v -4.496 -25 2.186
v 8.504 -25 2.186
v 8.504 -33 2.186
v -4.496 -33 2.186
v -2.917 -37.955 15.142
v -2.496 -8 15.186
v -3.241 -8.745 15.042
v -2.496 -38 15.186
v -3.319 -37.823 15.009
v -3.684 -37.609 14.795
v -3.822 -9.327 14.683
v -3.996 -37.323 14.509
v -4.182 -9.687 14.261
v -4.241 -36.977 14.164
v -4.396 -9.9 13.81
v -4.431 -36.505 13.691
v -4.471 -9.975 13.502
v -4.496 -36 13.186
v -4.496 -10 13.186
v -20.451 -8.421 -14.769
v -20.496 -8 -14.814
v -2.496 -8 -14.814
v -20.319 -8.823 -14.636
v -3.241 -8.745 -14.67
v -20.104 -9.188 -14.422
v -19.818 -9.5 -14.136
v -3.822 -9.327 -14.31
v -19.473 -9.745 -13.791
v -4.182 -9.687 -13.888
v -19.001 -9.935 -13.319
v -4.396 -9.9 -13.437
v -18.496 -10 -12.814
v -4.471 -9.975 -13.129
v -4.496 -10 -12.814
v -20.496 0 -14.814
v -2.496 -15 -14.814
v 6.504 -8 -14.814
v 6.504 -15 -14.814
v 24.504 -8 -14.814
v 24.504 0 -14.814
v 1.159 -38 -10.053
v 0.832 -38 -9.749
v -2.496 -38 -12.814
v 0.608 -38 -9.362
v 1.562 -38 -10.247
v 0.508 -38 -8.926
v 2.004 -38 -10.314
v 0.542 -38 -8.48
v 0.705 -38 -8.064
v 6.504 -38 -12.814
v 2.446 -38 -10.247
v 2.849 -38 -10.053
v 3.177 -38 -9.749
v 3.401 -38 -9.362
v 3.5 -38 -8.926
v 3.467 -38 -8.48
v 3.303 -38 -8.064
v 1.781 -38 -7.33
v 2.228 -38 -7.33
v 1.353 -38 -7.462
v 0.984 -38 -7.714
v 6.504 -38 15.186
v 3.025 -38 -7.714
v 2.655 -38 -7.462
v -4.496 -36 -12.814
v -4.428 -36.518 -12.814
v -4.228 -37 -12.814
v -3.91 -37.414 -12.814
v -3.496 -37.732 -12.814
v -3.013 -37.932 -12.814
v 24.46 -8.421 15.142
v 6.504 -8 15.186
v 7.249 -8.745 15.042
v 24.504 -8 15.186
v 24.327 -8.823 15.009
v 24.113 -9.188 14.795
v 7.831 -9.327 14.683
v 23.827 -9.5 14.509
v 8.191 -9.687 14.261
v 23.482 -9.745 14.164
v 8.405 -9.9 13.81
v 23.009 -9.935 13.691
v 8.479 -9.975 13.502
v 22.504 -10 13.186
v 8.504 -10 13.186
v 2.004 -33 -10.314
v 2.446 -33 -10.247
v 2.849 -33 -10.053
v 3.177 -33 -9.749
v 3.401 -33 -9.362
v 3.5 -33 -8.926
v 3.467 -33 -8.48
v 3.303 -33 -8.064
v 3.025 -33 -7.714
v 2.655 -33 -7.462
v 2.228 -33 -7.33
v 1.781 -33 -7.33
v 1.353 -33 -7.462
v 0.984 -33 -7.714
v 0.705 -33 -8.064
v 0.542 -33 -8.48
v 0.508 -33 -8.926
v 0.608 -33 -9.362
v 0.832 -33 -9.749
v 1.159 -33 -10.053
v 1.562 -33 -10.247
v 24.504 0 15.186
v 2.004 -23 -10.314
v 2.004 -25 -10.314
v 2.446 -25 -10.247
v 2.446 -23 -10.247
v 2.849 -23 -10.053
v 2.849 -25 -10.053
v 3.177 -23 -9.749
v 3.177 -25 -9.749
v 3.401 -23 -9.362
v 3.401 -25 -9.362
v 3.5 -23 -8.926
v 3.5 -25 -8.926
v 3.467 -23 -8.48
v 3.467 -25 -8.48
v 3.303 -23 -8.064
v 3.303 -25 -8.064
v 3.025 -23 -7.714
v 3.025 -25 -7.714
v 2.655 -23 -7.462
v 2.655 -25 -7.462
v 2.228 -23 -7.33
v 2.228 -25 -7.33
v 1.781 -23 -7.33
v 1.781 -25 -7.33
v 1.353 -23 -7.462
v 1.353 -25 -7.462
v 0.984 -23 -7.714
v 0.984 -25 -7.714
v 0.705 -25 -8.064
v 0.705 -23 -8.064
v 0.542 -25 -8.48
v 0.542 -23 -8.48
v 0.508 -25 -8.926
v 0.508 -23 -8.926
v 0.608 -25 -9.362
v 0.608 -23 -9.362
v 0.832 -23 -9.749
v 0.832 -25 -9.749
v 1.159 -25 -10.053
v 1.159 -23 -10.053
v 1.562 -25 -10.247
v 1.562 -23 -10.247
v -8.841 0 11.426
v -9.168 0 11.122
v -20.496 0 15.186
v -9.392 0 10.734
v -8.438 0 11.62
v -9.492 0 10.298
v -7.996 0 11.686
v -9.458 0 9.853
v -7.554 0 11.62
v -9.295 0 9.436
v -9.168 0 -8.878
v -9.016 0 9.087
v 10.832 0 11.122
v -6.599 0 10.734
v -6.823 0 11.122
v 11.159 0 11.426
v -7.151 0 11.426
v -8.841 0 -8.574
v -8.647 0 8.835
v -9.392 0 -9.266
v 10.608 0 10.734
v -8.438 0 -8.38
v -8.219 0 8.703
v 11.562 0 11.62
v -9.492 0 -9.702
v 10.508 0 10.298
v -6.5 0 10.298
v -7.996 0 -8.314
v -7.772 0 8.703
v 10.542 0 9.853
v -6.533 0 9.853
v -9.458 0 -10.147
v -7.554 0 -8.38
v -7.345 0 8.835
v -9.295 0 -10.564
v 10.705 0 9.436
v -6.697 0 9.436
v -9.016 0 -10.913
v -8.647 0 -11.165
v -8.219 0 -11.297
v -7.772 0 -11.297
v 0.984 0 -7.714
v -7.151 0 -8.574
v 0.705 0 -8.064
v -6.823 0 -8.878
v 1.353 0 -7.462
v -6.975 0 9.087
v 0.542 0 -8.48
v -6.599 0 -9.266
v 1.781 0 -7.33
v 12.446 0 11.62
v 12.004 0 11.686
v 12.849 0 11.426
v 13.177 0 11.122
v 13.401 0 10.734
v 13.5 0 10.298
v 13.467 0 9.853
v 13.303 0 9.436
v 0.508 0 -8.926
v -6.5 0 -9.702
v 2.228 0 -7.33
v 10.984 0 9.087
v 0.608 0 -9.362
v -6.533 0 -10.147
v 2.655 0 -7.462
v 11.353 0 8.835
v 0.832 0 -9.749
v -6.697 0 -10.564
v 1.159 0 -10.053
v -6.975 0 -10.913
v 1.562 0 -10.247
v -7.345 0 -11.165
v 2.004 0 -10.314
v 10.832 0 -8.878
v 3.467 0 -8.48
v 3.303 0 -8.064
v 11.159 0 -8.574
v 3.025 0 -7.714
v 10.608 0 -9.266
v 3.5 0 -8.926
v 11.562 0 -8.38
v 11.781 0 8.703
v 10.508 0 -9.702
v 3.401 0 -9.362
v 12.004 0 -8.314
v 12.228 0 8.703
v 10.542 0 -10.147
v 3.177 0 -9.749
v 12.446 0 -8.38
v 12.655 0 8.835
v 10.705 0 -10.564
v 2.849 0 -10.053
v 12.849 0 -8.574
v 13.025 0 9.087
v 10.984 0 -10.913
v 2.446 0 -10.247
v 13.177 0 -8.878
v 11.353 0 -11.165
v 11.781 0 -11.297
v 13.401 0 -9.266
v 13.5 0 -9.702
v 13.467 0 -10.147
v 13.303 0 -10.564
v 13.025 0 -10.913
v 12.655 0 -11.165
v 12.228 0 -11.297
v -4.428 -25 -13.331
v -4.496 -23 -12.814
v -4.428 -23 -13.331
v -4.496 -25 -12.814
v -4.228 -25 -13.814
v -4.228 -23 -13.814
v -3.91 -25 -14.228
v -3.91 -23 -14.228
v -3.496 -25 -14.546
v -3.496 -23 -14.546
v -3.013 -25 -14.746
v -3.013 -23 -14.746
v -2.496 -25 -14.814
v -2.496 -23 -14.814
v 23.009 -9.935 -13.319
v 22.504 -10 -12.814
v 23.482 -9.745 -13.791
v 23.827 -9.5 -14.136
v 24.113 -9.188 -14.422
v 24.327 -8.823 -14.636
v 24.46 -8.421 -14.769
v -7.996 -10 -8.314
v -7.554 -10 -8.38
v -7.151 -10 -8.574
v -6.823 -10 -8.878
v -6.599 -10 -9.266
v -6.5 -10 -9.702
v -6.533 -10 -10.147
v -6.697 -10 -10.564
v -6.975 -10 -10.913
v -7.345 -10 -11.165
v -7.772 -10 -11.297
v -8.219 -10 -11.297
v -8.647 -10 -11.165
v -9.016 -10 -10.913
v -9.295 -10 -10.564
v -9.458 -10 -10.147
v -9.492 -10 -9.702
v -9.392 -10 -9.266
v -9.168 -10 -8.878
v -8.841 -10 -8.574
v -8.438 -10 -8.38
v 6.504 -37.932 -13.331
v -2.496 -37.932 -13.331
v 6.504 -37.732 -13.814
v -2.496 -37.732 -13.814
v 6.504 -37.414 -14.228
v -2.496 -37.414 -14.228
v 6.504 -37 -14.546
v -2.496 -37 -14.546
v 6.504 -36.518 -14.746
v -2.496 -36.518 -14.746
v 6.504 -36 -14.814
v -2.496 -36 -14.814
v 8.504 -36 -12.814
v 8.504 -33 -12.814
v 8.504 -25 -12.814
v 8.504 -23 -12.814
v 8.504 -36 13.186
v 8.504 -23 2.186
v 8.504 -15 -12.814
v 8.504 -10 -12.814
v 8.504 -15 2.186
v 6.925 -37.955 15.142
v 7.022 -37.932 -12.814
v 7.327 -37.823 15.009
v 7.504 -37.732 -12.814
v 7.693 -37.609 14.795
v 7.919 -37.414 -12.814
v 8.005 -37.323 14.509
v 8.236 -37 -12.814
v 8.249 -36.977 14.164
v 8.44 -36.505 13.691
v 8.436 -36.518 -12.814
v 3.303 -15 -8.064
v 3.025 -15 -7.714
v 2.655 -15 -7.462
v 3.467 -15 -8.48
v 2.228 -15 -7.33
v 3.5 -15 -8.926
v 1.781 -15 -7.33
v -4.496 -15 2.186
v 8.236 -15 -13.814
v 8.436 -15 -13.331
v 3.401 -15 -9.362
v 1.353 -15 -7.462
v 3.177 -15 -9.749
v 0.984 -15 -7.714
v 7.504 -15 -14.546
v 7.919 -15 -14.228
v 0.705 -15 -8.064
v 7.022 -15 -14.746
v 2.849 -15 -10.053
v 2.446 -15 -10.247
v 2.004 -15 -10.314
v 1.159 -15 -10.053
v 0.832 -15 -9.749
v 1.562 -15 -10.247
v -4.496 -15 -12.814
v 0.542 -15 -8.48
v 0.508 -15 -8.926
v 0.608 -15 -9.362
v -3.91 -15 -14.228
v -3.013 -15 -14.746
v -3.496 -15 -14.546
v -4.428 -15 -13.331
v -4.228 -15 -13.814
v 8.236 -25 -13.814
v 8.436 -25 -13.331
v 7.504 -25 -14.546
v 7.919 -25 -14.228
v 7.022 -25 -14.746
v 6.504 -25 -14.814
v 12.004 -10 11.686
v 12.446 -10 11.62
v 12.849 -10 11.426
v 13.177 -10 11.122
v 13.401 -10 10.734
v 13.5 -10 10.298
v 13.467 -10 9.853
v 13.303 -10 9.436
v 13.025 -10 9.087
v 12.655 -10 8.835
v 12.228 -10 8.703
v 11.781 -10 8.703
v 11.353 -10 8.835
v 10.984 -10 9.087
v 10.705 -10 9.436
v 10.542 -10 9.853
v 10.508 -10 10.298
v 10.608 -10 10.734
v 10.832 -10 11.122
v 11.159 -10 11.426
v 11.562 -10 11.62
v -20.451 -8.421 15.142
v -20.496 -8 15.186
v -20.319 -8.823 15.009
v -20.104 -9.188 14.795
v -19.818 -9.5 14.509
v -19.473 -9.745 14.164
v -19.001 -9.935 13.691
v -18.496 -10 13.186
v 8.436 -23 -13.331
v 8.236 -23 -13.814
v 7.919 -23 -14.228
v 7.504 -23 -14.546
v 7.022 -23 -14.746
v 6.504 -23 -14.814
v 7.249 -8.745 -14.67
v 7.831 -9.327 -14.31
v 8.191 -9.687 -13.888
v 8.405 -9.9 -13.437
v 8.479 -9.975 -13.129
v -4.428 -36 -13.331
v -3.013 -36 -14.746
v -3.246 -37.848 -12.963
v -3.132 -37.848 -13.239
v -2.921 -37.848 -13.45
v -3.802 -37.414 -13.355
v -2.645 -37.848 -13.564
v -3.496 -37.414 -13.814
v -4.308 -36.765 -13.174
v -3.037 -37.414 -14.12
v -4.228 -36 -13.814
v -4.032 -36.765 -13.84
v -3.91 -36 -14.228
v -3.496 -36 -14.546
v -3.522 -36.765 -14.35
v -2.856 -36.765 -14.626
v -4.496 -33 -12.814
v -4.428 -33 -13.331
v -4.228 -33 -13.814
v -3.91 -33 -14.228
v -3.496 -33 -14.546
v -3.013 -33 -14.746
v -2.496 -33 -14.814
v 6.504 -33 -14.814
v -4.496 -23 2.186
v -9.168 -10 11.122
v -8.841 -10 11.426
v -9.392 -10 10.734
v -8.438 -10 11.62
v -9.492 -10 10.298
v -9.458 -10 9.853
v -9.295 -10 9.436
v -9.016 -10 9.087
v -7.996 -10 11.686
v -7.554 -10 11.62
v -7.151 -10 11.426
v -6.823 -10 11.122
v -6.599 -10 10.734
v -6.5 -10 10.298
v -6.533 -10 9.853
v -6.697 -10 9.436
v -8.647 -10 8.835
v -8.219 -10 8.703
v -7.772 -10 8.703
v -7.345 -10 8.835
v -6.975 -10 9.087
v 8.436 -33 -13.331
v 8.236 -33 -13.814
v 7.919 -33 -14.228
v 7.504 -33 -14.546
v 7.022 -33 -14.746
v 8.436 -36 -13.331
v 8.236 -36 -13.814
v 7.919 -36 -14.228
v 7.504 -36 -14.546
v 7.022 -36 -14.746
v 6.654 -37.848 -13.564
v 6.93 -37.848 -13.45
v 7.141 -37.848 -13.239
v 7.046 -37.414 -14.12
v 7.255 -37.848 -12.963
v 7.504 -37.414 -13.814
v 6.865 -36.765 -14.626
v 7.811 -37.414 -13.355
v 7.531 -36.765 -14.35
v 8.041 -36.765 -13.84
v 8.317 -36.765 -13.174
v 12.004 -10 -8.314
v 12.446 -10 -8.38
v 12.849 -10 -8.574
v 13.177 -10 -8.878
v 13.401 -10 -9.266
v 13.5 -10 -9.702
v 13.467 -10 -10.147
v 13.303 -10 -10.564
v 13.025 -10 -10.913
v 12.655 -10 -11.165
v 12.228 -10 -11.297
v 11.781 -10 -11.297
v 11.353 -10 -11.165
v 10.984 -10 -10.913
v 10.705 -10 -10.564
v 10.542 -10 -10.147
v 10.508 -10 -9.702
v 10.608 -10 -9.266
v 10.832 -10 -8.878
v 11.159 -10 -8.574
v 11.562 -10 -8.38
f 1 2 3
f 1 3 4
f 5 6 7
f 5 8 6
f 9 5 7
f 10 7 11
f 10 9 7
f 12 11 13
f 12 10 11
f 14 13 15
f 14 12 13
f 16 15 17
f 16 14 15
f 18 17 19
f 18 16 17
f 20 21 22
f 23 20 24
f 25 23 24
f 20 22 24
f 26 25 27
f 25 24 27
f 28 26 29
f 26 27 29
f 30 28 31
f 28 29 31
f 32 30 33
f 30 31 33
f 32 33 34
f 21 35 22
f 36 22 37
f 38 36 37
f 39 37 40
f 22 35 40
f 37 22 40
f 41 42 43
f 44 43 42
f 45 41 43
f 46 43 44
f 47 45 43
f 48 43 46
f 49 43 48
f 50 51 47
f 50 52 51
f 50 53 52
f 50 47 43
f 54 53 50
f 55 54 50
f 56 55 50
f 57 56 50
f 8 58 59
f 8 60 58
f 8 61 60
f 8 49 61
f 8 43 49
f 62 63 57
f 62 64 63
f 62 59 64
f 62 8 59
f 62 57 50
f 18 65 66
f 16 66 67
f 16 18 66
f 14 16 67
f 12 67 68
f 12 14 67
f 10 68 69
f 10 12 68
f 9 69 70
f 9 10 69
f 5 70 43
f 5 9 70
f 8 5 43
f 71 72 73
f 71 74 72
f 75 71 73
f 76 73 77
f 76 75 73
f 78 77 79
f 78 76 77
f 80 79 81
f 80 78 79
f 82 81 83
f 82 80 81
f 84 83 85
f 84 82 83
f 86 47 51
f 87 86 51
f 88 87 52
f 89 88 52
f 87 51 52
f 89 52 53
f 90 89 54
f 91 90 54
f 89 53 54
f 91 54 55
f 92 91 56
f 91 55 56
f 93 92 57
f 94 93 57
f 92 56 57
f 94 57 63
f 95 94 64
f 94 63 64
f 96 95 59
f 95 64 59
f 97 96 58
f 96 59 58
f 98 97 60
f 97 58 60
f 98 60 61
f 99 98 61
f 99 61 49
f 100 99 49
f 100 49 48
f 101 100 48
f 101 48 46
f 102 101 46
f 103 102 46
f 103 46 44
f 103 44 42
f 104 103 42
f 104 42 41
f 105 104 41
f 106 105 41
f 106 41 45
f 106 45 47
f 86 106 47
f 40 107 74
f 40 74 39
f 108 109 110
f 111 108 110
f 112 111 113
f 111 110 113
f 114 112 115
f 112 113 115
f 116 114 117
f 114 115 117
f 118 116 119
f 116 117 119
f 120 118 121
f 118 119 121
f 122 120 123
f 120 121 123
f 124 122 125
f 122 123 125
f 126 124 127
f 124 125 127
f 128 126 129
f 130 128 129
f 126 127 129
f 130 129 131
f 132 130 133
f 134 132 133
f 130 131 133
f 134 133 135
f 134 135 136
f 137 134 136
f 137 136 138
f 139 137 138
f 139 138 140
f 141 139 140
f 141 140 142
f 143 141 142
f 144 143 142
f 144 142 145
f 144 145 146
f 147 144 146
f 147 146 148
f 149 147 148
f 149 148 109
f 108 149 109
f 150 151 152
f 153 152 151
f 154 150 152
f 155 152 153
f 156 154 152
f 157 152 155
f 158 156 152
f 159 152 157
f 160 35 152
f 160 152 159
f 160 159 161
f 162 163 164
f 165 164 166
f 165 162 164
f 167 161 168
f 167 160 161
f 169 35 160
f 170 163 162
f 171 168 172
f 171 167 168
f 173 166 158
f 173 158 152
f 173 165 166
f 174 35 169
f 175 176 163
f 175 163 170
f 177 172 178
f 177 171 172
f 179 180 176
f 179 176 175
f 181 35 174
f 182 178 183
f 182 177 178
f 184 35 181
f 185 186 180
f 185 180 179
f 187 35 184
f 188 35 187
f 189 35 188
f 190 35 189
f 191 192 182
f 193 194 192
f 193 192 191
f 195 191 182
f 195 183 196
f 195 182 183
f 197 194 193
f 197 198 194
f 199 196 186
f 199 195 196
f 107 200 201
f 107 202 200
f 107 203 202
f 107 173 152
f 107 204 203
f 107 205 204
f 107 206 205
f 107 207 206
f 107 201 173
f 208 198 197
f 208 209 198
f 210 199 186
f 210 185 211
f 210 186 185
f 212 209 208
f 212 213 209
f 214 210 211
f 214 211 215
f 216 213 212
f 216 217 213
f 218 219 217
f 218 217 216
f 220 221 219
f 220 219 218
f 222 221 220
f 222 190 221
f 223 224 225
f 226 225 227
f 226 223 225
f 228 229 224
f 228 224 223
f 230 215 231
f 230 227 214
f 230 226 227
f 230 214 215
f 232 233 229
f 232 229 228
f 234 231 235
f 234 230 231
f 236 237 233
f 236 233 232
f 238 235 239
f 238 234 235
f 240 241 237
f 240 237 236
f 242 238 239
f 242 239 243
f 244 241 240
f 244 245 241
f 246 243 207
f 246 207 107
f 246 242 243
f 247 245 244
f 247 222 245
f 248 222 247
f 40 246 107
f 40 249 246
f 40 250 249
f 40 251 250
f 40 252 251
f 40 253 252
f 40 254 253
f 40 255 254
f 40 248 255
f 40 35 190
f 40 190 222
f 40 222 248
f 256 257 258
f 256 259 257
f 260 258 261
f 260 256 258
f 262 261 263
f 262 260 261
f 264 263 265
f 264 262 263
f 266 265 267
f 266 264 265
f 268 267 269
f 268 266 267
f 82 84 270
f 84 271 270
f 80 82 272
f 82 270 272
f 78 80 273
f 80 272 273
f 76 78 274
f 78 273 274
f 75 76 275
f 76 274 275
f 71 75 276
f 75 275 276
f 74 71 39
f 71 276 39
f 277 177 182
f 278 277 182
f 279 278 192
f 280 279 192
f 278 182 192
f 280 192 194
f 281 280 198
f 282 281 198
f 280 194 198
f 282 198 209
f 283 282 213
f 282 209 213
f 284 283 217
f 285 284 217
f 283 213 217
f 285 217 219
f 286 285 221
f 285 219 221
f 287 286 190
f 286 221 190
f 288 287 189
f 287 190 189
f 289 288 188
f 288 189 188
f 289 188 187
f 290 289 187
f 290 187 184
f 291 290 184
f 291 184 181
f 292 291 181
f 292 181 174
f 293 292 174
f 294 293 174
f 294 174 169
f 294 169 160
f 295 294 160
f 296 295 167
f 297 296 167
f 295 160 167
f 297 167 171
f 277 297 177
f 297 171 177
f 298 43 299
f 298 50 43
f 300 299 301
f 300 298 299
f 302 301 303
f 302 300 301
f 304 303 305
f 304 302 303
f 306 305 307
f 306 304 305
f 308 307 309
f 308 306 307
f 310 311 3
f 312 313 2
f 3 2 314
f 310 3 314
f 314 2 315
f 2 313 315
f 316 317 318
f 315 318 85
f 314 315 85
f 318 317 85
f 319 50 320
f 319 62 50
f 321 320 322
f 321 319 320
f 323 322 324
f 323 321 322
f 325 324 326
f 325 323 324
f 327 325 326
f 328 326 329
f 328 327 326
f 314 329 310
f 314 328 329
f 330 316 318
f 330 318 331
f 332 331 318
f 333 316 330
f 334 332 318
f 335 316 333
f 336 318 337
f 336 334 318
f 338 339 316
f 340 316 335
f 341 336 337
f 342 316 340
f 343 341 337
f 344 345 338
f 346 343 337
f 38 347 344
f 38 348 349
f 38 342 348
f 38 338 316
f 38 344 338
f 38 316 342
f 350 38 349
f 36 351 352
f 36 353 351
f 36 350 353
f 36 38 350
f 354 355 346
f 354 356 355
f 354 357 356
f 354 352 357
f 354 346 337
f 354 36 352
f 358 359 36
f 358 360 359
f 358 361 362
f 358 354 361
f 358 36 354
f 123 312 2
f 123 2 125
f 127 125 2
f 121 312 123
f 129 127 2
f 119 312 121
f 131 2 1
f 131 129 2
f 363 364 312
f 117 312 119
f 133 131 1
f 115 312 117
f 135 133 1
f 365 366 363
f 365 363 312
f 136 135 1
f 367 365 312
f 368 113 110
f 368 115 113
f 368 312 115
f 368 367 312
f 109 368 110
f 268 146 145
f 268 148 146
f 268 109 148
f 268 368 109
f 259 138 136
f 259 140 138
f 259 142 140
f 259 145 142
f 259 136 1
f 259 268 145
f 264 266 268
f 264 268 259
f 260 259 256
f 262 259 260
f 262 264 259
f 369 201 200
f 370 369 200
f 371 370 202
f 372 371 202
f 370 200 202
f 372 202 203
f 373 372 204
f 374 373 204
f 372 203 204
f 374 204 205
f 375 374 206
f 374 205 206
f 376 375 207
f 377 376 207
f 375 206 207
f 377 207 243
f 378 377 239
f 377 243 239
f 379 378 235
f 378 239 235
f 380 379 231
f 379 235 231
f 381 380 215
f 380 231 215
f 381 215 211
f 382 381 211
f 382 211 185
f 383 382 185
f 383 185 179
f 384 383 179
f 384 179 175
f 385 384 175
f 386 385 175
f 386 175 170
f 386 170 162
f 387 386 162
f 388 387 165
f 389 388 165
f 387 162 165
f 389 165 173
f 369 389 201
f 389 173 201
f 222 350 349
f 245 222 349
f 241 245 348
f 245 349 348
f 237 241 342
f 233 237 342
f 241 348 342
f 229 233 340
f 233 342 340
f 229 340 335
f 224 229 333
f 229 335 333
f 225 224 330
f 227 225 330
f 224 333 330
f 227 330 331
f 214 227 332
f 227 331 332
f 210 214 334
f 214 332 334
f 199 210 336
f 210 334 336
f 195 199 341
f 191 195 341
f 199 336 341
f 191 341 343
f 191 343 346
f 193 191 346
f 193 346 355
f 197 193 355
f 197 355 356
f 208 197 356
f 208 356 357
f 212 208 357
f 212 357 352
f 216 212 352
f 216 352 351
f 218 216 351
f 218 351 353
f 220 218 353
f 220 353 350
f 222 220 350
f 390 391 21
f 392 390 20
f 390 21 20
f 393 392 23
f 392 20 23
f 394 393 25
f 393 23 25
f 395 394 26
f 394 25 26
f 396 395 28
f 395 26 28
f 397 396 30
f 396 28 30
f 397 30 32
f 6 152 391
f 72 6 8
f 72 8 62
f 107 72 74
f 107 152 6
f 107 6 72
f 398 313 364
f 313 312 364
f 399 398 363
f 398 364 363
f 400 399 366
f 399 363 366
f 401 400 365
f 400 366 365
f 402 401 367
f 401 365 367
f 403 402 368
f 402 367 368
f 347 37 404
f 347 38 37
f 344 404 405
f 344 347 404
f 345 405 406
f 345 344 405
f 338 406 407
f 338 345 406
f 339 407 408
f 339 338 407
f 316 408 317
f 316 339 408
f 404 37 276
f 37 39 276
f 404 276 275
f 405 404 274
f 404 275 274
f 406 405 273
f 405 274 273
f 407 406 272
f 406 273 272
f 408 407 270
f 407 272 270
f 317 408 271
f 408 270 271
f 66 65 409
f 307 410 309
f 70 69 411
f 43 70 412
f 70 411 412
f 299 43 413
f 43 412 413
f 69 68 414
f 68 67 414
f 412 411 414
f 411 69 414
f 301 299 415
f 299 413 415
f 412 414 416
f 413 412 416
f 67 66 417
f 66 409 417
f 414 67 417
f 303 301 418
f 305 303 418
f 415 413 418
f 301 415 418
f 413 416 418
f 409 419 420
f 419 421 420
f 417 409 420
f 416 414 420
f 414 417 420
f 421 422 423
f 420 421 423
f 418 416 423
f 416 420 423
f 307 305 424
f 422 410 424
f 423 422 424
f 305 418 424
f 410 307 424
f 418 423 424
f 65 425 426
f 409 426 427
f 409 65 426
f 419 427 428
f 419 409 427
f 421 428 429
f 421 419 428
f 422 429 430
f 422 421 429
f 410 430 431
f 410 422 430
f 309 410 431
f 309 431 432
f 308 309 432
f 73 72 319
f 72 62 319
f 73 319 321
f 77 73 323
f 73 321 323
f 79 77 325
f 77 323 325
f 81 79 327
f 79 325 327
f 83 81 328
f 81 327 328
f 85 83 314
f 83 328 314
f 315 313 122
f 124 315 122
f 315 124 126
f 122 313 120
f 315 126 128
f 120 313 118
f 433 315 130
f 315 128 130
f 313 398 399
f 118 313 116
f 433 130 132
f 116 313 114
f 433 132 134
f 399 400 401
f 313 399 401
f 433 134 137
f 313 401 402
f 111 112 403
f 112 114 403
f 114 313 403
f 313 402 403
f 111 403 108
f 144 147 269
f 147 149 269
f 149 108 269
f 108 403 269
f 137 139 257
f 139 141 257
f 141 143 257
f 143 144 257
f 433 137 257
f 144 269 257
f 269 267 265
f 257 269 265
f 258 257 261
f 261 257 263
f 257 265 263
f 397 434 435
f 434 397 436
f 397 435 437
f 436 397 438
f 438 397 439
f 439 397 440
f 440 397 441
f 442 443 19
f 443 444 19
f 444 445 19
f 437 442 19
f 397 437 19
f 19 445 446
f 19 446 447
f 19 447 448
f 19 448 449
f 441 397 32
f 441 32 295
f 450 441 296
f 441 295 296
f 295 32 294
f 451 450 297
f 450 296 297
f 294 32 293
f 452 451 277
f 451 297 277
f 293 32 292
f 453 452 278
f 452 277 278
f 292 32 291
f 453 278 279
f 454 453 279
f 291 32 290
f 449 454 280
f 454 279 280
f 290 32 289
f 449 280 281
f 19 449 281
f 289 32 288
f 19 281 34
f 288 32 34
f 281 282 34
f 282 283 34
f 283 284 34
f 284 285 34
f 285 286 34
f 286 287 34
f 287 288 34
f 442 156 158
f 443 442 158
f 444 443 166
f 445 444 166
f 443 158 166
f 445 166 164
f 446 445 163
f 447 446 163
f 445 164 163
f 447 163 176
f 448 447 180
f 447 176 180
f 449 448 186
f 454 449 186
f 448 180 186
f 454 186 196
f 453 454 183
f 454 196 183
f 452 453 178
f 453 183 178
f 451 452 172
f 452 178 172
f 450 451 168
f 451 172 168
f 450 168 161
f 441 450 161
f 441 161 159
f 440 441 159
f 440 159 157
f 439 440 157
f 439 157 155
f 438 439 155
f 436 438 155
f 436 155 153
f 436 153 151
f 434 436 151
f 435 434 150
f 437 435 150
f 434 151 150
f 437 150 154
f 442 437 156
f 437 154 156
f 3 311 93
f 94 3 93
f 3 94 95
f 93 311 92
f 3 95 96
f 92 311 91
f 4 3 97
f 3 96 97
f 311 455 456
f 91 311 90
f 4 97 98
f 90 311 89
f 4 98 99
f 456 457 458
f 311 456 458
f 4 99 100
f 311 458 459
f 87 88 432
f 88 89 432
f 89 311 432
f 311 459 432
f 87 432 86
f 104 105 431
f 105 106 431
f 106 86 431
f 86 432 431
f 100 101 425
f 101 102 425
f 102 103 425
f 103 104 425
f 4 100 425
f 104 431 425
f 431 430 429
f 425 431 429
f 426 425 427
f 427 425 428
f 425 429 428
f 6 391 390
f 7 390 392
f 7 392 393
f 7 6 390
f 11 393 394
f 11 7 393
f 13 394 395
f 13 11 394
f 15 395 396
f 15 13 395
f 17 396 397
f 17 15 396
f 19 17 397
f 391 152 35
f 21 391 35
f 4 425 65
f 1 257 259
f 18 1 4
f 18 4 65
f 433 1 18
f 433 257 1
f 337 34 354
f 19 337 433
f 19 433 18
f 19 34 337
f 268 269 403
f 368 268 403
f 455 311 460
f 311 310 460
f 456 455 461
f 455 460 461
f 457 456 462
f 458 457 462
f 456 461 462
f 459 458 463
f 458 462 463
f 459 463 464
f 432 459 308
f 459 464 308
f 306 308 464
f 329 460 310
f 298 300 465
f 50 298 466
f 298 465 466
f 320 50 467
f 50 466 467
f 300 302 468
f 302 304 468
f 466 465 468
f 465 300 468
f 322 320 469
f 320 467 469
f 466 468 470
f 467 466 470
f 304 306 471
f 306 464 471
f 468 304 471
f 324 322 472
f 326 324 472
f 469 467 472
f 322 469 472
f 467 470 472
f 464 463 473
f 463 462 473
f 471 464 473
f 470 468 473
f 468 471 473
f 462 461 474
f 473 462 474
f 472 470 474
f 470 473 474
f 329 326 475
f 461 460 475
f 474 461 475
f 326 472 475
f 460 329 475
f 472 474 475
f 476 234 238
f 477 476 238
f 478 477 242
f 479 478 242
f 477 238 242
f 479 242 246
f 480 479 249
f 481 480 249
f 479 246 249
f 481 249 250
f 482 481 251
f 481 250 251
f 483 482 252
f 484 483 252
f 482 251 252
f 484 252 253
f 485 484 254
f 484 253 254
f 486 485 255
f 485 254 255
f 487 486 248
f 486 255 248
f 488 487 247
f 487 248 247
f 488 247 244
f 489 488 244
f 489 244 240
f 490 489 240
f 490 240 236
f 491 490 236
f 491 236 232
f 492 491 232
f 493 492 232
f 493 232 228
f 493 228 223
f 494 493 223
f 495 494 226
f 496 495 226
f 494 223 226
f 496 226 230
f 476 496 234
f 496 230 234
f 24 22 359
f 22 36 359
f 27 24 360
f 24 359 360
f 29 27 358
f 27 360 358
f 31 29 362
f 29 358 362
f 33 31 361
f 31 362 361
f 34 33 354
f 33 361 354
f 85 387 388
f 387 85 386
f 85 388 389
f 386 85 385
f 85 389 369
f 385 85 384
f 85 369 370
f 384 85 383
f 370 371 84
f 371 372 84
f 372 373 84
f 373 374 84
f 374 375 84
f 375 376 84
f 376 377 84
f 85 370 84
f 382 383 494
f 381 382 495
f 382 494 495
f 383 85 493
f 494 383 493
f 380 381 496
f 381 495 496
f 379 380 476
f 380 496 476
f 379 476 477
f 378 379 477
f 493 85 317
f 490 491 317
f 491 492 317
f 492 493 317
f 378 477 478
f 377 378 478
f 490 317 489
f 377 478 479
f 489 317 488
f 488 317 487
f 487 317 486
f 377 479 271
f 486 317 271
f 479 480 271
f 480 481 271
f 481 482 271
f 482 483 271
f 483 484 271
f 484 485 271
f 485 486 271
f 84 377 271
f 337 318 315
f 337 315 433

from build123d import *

# Parameters (mm, degrees)
SKETCH1_W           = 45
SKETCH1_H           = 30
SKETCH1_R           = 1.5
BOSS_EXTRUDE1_DEPTH = 10
SKETCH5_W           = 13
SKETCH5_H           = 30
BOSS_EXTRUDE2_DEPTH = 28
SKETCH7_W           = 13
SKETCH7_H           = 8
CUT_EXTRUDE1_DEPTH  = 17
SKETCH8_R           = 1.5
CUT_EXTRUDE2_DEPTH  = 48.697863598
FILLET1_R           = 2


with BuildPart() as part:
    # Sketch1 → Boss-Extrude1 (new body)
    with BuildSketch(Plane(origin=(0, 0, 0), x_dir=(1, 0, 0), z_dir=(0, 1, 0))):
        with Locations((2.00430517, -0.186349789)):
            Rectangle(SKETCH1_W, SKETCH1_H)
        with Locations(Location((-7.99569483, 9.813650211, 0), (0, 0, 270))):
            Circle(SKETCH1_R, mode=Mode.SUBTRACT)
        with Locations(Location((12.00430517, 9.813650211, 0), (0, 0, 270))):
            Circle(SKETCH1_R, mode=Mode.SUBTRACT)
        with Locations(Location((12.00430517, -10.186349789, 0), (0, 0, 270))):
            Circle(SKETCH1_R, mode=Mode.SUBTRACT)
        with Locations(Location((-7.99569483, -10.186349789, 0), (0, 0, 270))):
            Circle(SKETCH1_R, mode=Mode.SUBTRACT)
    extrude(amount=-BOSS_EXTRUDE1_DEPTH)

    # Sketch5 → Boss-Extrude2 (add)
    with BuildSketch(Plane.XZ.offset(10)):
        with Locations((2.00430517, 0.186349789)):
            Rectangle(SKETCH5_W, SKETCH5_H)
    extrude(amount=BOSS_EXTRUDE2_DEPTH)

    # Sketch7 → Cut-Extrude1 (cut)
    with BuildSketch(Plane(origin=(0, 0, -14.813650211), x_dir=(-1, 0, 0), z_dir=(0, 0, -1))):
        with Locations((-2.00430517, -29)):
            Rectangle(SKETCH7_W, SKETCH7_H)
        with Locations((-2.00430517, -19)):
            Rectangle(SKETCH7_W, SKETCH7_H)
    extrude(amount=-CUT_EXTRUDE1_DEPTH, mode=Mode.SUBTRACT)

    # Sketch8 → Cut-Extrude2 (cut, through all)
    with BuildSketch(Plane.XZ.offset(38)):
        with Locations(Location((2.00430517, -8.813650211, 0), (0, 0, 270))):
            Circle(SKETCH8_R)
    extrude(amount=-CUT_EXTRUDE2_DEPTH, mode=Mode.SUBTRACT)

    # Fillet1
    fillet1_edges = [part.edges().sort_by_distance(p)[0] for p in [
        (16.50430517, -10, 15.186349789),
        (16.50430517, -10, -14.813650211),
        (24.50430517, -10, 0.186349789),
        (-4.49569483, -24, 15.186349789),
        (-4.49569483, -35.5, -14.813650211),
        (8.50430517, -35.5, -14.813650211),
        (8.50430517, -24, 15.186349789),
        (-4.49569483, -38, 0.186349789),
        (2.00430517, -38, -14.813650211),
        (8.50430517, -38, 0.186349789),
        (-12.49569483, -10, -14.813650211),
        (-20.49569483, -10, 0.186349789),
        (8.50430517, -24, -14.813650211),
        (8.50430517, -12.5, -14.813650211),
        (-12.49569483, -10, 15.186349789),
        (-4.49569483, -24, -14.813650211),
        (-4.49569483, -12.5, -14.813650211),
    ]]
    fillet(fillet1_edges, radius=FILLET1_R)


solid = part.part
